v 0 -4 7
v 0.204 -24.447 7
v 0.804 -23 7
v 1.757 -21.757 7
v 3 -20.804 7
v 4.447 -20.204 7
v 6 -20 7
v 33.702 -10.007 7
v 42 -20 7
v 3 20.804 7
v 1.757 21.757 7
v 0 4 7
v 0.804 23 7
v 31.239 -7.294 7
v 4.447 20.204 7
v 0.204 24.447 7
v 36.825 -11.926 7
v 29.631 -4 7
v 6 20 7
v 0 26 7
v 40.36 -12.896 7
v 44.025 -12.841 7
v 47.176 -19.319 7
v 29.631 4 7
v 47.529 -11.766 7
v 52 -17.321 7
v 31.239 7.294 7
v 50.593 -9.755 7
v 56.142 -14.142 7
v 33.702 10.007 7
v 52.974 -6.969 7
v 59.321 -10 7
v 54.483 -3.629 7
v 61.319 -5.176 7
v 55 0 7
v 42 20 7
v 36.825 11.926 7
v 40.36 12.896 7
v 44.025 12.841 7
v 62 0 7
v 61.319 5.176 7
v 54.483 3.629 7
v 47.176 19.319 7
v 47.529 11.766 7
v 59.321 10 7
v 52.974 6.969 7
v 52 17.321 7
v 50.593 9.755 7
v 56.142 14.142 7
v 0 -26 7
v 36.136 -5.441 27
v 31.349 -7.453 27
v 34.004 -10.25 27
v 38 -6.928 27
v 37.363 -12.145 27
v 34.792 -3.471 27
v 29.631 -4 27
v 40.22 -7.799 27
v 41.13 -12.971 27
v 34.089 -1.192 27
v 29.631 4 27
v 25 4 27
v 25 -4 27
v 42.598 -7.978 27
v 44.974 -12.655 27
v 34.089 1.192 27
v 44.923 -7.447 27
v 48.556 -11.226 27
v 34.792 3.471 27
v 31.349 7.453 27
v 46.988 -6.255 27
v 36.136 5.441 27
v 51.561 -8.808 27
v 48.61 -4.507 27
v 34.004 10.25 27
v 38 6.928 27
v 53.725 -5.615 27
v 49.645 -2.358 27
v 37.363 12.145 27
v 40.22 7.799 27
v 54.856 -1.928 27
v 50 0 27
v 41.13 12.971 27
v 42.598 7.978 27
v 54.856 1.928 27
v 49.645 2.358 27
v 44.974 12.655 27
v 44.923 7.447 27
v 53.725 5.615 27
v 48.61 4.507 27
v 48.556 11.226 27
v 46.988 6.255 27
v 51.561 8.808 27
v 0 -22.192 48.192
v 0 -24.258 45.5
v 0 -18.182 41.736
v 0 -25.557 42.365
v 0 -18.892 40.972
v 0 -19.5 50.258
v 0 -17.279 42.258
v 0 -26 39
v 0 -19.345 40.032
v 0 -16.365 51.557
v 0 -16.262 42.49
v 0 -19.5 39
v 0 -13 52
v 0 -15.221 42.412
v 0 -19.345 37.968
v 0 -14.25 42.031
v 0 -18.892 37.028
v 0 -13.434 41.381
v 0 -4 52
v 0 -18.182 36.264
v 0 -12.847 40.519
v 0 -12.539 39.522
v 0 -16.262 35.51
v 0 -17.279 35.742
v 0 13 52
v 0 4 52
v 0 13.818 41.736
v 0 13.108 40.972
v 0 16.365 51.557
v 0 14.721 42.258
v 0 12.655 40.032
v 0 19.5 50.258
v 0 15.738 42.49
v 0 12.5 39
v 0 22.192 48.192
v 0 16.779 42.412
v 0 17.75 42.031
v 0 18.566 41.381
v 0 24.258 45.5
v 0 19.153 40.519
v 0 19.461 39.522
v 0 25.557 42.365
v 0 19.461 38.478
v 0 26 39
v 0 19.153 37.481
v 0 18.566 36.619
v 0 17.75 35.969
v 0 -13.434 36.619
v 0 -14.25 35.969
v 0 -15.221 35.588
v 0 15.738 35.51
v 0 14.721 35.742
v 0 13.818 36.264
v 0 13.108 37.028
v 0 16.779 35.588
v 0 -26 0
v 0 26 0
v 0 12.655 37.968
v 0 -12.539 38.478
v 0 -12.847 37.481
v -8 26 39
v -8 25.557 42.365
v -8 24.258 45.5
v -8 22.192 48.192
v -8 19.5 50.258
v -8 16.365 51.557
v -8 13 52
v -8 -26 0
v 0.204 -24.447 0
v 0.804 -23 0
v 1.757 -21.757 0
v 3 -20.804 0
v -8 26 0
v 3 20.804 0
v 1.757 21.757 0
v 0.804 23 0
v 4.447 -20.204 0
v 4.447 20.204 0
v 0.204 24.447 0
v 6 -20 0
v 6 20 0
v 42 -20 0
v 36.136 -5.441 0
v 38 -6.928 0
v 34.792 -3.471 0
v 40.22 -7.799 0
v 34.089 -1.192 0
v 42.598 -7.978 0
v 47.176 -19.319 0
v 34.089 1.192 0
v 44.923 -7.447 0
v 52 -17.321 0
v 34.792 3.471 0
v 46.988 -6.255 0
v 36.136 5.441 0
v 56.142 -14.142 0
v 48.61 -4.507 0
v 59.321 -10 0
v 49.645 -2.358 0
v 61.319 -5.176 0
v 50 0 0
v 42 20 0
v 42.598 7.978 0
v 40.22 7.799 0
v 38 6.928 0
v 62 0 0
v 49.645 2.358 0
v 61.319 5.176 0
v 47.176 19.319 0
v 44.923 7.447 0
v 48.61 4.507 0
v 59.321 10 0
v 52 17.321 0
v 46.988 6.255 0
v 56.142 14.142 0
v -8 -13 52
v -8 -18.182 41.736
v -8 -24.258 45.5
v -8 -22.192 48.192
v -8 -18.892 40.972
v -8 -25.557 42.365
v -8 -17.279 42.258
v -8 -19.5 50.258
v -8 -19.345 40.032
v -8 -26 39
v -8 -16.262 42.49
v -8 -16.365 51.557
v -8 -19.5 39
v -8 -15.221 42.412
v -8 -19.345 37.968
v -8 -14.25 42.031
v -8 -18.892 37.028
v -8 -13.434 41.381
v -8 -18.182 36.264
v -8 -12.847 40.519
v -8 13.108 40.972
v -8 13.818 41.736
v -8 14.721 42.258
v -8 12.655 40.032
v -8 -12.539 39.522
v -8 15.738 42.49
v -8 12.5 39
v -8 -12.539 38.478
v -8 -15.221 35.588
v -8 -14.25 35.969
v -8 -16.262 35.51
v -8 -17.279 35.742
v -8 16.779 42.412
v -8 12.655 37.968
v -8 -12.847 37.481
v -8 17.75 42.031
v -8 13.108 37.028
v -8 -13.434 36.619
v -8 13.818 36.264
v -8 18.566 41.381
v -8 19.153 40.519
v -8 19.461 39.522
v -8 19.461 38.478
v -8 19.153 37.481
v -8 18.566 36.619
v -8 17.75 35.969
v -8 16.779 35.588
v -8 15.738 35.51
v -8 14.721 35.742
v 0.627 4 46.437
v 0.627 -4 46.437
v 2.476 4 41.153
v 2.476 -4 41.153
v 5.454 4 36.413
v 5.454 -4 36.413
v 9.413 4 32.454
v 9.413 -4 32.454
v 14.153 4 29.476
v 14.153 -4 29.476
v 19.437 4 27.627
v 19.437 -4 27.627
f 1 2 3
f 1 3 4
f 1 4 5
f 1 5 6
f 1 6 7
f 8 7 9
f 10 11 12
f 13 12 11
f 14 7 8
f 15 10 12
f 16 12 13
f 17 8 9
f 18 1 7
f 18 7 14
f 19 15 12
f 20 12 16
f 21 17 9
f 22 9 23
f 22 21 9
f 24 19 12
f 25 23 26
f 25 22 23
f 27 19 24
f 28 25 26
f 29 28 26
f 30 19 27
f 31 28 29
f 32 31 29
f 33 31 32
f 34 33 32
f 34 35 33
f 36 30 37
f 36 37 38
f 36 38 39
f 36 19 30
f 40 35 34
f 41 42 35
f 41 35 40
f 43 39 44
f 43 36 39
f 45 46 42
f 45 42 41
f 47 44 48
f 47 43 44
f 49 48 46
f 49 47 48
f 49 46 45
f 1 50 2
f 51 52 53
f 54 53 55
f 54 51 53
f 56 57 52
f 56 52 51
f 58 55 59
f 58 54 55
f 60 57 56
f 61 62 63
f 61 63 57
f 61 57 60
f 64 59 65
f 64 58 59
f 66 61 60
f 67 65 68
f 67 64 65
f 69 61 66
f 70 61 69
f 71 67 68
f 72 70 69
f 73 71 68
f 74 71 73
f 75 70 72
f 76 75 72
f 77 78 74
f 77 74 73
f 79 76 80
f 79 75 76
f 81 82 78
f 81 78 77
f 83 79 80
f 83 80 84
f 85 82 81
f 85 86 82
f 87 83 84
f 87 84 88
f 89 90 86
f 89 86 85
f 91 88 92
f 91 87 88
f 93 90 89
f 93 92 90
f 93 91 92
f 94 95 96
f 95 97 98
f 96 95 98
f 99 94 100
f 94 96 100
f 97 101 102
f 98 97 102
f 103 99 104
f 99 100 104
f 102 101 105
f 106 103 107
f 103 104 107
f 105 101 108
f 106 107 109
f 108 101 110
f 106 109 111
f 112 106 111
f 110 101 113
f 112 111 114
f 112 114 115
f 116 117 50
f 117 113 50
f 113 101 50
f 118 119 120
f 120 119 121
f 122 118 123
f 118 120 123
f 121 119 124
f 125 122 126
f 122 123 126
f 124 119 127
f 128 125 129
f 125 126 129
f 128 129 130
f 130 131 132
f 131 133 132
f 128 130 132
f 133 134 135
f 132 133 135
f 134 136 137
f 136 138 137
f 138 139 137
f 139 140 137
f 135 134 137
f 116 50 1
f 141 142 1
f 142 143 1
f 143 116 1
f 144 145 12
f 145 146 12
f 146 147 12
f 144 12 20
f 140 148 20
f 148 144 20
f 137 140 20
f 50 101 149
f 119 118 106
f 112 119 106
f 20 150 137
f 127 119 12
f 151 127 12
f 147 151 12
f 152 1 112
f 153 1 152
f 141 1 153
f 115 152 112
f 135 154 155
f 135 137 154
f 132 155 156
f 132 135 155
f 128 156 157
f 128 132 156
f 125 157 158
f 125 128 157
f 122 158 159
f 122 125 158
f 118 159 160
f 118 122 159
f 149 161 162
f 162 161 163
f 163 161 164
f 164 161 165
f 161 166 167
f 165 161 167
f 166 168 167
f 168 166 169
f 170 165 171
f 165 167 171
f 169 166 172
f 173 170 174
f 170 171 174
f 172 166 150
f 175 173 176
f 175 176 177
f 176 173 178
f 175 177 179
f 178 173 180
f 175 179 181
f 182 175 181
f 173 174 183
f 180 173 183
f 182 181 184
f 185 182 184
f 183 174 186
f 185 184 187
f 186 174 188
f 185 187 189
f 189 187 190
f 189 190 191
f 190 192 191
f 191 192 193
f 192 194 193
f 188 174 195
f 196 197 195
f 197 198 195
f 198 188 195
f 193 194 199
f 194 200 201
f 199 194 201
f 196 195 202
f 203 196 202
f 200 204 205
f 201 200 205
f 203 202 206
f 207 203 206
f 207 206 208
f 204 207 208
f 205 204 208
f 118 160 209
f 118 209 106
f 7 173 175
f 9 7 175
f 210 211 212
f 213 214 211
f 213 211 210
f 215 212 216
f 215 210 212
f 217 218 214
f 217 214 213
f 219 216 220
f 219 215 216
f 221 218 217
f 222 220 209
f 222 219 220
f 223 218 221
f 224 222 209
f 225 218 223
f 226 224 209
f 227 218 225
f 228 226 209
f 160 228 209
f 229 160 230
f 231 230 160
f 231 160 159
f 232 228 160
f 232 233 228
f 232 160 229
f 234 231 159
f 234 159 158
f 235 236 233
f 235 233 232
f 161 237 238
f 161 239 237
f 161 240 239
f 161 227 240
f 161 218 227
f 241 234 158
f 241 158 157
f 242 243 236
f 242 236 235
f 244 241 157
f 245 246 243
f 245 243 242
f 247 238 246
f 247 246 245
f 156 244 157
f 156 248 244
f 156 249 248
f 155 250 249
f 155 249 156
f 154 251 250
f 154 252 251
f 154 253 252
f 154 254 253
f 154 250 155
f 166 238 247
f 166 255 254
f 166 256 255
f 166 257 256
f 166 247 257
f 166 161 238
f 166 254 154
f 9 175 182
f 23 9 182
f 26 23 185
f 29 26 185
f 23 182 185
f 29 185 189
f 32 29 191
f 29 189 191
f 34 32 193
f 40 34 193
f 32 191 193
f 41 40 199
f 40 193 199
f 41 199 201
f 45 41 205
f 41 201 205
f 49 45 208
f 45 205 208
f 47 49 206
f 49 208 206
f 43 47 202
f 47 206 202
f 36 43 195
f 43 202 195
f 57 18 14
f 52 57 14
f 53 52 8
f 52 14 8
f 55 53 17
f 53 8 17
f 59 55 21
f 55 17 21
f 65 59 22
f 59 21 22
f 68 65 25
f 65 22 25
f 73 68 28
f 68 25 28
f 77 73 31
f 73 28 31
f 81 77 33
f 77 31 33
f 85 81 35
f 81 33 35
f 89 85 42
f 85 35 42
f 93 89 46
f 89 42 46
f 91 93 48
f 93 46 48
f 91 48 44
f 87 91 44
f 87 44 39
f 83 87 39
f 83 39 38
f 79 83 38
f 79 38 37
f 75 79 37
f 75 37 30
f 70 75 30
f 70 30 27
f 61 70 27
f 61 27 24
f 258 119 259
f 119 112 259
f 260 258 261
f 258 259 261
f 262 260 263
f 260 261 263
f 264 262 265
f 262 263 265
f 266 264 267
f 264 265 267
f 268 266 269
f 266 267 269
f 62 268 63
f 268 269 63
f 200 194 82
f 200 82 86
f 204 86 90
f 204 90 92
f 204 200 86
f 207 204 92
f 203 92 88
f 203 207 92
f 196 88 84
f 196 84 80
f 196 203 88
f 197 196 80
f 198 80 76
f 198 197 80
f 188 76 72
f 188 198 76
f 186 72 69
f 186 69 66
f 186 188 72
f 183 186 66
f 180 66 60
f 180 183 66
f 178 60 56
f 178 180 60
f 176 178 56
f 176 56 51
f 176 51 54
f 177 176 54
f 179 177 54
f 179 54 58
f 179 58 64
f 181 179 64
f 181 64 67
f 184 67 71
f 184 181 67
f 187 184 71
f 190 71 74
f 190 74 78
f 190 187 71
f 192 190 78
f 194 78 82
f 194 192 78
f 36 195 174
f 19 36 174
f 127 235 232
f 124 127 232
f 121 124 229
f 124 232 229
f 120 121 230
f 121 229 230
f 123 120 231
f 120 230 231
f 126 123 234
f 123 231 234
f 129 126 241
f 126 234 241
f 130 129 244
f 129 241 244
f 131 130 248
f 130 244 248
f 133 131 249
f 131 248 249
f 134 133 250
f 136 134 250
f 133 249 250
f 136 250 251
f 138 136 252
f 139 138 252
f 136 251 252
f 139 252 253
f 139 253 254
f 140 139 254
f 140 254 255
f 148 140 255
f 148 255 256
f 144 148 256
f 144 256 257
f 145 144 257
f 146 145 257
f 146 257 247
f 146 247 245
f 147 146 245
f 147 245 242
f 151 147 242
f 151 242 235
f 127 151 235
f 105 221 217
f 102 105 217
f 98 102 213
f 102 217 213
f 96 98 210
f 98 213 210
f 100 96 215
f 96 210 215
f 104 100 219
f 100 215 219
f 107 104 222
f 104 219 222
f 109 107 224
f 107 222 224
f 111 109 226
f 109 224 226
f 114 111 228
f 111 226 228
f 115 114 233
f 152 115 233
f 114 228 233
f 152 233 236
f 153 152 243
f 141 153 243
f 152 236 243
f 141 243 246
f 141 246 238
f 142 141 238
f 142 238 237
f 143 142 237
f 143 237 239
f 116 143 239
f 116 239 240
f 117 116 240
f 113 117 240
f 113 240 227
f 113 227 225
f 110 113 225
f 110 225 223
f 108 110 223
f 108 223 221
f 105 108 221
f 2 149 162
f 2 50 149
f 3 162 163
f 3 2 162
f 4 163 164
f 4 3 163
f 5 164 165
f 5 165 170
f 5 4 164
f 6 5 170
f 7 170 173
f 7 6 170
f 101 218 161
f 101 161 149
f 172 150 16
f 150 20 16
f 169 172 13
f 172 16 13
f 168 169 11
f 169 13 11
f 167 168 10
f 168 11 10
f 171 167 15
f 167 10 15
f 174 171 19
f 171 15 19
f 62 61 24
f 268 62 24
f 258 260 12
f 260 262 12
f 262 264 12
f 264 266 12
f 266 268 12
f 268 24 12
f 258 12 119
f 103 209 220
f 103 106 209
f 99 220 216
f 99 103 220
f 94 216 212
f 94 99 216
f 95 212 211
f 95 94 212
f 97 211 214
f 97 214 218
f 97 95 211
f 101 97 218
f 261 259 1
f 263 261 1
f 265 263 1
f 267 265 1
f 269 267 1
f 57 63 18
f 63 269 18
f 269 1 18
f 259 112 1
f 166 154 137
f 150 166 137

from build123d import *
from OCP.BRepFilletAPI import BRepFilletAPI_MakeFillet

# Parameters (mm, degrees)
SKETCH1_W                  = 8
SKETCH1_H                  = 52
BOSS_EXTRUDE1_DEPTH        = 52
BOSS_EXTRUDE2_DEPTH        = 7
SKETCH1_4_R                = 13
SKETCH1_4_R_2              = 8
BOSS_EXTRUDE3_DEPTH        = 27
FILLET1_R                  = 25
FILLET1_R_2                = 6
FILLET1_R_3                = 13
F_12_0MM_DOWEL_HOLE1_D     = 7
F_12_0MM_DOWEL_HOLE1_DEPTH = 30
F_12_0MM_DOWEL_HOLE1_TIP   = 2.103012167


with BuildPart() as part:
    # Sketch1 → Boss-Extrude1 (new body)
    with BuildSketch(Plane.XY):
        with Locations((-4, 0)):
            Rectangle(SKETCH1_W, SKETCH1_H)
    extrude(amount=BOSS_EXTRUDE1_DEPTH)

    # Sketch1<3> → Boss-Extrude2 (add)
    with BuildSketch(Plane.XY):
        with BuildLine():
            Line((42, 20), (0, 20))
            Line((0, 20), (0, 4))
            Line((0, 4), (29.630683123, 4))
            ThreePointArc((29.630683123, 4), (44.02470746, 12.841361287), (55, 0))
            ThreePointArc((55, 0), (44.02470746, -12.841361287), (29.630683123, -4))
            Line((29.630683123, -4), (0, -4))
            Line((0, -4), (0, -20))
            Line((0, -20), (42, -20))
            ThreePointArc((42, -20), (62, 0), (42, 20))
        make_face()
    extrude(amount=BOSS_EXTRUDE2_DEPTH)

    # Sketch1<4> → Boss-Extrude3 (add)
    # profile 1 of 2: a face of its own
    with BuildSketch(Plane.XY):
        with Locations((42, 0)):
            Circle(SKETCH1_4_R)
        with Locations((42, 0)):
            Circle(SKETCH1_4_R_2, mode=Mode.SUBTRACT)
    # profile 2 of 2: a face of its own
    with BuildSketch(Plane.XY):
        with BuildLine():
            Line((29.630683123, 4), (0, 4))
            Line((0, 4), (0, -4))
            Line((0, -4), (29.630683123, -4))
            ThreePointArc((29.630683123, -4), (29, 0), (29.630683123, 4))
        make_face()
    extrude(amount=BOSS_EXTRUDE3_DEPTH)

    # Fillet1
    fillet1_edges_1 = [part.edges().sort_by_distance(p)[0] for p in [
        (0, 0, 27),
    ]]
    fillet1_edges_2 = [part.edges().sort_by_distance(p)[0] for p in [
        (0, -20, 3.5),
        (0, 20, 3.5),
    ]]
    fillet1 = BRepFilletAPI_MakeFillet(part.part.solid().wrapped)
    for e in fillet1_edges_1:
        fillet1.Add(FILLET1_R - 0.0001, e.wrapped)
    for e in fillet1_edges_2:
        fillet1.Add(FILLET1_R_2 - 0.0001, e.wrapped)
    add(Compound.cast(fillet1.Shape()), mode=Mode.REPLACE)  # a hair under: the kernel refuses the full size
    fillet1_2_edges = [part.edges().sort_by_distance(p)[0] for p in [
        (-4, -26, 52),
        (-4, 26, 52),
    ]]
    fillet(fillet1_2_edges, radius=FILLET1_R_3)

    # Ø12.0mm Dowel Hole1
    with Locations(Plane(origin=(0, 16, 39), x_dir=(0, 1, 0), z_dir=(1, 0, 0))):
        with Locations((0, 0), (-32, 0)):
            Hole(F_12_0MM_DOWEL_HOLE1_D / 2, depth=F_12_0MM_DOWEL_HOLE1_DEPTH)
            with Locations((0, 0, -(F_12_0MM_DOWEL_HOLE1_DEPTH + F_12_0MM_DOWEL_HOLE1_TIP / 2))):  # 118° drill point
                Cone(0, F_12_0MM_DOWEL_HOLE1_D / 2, F_12_0MM_DOWEL_HOLE1_TIP, mode=Mode.SUBTRACT)


solid = part.part
